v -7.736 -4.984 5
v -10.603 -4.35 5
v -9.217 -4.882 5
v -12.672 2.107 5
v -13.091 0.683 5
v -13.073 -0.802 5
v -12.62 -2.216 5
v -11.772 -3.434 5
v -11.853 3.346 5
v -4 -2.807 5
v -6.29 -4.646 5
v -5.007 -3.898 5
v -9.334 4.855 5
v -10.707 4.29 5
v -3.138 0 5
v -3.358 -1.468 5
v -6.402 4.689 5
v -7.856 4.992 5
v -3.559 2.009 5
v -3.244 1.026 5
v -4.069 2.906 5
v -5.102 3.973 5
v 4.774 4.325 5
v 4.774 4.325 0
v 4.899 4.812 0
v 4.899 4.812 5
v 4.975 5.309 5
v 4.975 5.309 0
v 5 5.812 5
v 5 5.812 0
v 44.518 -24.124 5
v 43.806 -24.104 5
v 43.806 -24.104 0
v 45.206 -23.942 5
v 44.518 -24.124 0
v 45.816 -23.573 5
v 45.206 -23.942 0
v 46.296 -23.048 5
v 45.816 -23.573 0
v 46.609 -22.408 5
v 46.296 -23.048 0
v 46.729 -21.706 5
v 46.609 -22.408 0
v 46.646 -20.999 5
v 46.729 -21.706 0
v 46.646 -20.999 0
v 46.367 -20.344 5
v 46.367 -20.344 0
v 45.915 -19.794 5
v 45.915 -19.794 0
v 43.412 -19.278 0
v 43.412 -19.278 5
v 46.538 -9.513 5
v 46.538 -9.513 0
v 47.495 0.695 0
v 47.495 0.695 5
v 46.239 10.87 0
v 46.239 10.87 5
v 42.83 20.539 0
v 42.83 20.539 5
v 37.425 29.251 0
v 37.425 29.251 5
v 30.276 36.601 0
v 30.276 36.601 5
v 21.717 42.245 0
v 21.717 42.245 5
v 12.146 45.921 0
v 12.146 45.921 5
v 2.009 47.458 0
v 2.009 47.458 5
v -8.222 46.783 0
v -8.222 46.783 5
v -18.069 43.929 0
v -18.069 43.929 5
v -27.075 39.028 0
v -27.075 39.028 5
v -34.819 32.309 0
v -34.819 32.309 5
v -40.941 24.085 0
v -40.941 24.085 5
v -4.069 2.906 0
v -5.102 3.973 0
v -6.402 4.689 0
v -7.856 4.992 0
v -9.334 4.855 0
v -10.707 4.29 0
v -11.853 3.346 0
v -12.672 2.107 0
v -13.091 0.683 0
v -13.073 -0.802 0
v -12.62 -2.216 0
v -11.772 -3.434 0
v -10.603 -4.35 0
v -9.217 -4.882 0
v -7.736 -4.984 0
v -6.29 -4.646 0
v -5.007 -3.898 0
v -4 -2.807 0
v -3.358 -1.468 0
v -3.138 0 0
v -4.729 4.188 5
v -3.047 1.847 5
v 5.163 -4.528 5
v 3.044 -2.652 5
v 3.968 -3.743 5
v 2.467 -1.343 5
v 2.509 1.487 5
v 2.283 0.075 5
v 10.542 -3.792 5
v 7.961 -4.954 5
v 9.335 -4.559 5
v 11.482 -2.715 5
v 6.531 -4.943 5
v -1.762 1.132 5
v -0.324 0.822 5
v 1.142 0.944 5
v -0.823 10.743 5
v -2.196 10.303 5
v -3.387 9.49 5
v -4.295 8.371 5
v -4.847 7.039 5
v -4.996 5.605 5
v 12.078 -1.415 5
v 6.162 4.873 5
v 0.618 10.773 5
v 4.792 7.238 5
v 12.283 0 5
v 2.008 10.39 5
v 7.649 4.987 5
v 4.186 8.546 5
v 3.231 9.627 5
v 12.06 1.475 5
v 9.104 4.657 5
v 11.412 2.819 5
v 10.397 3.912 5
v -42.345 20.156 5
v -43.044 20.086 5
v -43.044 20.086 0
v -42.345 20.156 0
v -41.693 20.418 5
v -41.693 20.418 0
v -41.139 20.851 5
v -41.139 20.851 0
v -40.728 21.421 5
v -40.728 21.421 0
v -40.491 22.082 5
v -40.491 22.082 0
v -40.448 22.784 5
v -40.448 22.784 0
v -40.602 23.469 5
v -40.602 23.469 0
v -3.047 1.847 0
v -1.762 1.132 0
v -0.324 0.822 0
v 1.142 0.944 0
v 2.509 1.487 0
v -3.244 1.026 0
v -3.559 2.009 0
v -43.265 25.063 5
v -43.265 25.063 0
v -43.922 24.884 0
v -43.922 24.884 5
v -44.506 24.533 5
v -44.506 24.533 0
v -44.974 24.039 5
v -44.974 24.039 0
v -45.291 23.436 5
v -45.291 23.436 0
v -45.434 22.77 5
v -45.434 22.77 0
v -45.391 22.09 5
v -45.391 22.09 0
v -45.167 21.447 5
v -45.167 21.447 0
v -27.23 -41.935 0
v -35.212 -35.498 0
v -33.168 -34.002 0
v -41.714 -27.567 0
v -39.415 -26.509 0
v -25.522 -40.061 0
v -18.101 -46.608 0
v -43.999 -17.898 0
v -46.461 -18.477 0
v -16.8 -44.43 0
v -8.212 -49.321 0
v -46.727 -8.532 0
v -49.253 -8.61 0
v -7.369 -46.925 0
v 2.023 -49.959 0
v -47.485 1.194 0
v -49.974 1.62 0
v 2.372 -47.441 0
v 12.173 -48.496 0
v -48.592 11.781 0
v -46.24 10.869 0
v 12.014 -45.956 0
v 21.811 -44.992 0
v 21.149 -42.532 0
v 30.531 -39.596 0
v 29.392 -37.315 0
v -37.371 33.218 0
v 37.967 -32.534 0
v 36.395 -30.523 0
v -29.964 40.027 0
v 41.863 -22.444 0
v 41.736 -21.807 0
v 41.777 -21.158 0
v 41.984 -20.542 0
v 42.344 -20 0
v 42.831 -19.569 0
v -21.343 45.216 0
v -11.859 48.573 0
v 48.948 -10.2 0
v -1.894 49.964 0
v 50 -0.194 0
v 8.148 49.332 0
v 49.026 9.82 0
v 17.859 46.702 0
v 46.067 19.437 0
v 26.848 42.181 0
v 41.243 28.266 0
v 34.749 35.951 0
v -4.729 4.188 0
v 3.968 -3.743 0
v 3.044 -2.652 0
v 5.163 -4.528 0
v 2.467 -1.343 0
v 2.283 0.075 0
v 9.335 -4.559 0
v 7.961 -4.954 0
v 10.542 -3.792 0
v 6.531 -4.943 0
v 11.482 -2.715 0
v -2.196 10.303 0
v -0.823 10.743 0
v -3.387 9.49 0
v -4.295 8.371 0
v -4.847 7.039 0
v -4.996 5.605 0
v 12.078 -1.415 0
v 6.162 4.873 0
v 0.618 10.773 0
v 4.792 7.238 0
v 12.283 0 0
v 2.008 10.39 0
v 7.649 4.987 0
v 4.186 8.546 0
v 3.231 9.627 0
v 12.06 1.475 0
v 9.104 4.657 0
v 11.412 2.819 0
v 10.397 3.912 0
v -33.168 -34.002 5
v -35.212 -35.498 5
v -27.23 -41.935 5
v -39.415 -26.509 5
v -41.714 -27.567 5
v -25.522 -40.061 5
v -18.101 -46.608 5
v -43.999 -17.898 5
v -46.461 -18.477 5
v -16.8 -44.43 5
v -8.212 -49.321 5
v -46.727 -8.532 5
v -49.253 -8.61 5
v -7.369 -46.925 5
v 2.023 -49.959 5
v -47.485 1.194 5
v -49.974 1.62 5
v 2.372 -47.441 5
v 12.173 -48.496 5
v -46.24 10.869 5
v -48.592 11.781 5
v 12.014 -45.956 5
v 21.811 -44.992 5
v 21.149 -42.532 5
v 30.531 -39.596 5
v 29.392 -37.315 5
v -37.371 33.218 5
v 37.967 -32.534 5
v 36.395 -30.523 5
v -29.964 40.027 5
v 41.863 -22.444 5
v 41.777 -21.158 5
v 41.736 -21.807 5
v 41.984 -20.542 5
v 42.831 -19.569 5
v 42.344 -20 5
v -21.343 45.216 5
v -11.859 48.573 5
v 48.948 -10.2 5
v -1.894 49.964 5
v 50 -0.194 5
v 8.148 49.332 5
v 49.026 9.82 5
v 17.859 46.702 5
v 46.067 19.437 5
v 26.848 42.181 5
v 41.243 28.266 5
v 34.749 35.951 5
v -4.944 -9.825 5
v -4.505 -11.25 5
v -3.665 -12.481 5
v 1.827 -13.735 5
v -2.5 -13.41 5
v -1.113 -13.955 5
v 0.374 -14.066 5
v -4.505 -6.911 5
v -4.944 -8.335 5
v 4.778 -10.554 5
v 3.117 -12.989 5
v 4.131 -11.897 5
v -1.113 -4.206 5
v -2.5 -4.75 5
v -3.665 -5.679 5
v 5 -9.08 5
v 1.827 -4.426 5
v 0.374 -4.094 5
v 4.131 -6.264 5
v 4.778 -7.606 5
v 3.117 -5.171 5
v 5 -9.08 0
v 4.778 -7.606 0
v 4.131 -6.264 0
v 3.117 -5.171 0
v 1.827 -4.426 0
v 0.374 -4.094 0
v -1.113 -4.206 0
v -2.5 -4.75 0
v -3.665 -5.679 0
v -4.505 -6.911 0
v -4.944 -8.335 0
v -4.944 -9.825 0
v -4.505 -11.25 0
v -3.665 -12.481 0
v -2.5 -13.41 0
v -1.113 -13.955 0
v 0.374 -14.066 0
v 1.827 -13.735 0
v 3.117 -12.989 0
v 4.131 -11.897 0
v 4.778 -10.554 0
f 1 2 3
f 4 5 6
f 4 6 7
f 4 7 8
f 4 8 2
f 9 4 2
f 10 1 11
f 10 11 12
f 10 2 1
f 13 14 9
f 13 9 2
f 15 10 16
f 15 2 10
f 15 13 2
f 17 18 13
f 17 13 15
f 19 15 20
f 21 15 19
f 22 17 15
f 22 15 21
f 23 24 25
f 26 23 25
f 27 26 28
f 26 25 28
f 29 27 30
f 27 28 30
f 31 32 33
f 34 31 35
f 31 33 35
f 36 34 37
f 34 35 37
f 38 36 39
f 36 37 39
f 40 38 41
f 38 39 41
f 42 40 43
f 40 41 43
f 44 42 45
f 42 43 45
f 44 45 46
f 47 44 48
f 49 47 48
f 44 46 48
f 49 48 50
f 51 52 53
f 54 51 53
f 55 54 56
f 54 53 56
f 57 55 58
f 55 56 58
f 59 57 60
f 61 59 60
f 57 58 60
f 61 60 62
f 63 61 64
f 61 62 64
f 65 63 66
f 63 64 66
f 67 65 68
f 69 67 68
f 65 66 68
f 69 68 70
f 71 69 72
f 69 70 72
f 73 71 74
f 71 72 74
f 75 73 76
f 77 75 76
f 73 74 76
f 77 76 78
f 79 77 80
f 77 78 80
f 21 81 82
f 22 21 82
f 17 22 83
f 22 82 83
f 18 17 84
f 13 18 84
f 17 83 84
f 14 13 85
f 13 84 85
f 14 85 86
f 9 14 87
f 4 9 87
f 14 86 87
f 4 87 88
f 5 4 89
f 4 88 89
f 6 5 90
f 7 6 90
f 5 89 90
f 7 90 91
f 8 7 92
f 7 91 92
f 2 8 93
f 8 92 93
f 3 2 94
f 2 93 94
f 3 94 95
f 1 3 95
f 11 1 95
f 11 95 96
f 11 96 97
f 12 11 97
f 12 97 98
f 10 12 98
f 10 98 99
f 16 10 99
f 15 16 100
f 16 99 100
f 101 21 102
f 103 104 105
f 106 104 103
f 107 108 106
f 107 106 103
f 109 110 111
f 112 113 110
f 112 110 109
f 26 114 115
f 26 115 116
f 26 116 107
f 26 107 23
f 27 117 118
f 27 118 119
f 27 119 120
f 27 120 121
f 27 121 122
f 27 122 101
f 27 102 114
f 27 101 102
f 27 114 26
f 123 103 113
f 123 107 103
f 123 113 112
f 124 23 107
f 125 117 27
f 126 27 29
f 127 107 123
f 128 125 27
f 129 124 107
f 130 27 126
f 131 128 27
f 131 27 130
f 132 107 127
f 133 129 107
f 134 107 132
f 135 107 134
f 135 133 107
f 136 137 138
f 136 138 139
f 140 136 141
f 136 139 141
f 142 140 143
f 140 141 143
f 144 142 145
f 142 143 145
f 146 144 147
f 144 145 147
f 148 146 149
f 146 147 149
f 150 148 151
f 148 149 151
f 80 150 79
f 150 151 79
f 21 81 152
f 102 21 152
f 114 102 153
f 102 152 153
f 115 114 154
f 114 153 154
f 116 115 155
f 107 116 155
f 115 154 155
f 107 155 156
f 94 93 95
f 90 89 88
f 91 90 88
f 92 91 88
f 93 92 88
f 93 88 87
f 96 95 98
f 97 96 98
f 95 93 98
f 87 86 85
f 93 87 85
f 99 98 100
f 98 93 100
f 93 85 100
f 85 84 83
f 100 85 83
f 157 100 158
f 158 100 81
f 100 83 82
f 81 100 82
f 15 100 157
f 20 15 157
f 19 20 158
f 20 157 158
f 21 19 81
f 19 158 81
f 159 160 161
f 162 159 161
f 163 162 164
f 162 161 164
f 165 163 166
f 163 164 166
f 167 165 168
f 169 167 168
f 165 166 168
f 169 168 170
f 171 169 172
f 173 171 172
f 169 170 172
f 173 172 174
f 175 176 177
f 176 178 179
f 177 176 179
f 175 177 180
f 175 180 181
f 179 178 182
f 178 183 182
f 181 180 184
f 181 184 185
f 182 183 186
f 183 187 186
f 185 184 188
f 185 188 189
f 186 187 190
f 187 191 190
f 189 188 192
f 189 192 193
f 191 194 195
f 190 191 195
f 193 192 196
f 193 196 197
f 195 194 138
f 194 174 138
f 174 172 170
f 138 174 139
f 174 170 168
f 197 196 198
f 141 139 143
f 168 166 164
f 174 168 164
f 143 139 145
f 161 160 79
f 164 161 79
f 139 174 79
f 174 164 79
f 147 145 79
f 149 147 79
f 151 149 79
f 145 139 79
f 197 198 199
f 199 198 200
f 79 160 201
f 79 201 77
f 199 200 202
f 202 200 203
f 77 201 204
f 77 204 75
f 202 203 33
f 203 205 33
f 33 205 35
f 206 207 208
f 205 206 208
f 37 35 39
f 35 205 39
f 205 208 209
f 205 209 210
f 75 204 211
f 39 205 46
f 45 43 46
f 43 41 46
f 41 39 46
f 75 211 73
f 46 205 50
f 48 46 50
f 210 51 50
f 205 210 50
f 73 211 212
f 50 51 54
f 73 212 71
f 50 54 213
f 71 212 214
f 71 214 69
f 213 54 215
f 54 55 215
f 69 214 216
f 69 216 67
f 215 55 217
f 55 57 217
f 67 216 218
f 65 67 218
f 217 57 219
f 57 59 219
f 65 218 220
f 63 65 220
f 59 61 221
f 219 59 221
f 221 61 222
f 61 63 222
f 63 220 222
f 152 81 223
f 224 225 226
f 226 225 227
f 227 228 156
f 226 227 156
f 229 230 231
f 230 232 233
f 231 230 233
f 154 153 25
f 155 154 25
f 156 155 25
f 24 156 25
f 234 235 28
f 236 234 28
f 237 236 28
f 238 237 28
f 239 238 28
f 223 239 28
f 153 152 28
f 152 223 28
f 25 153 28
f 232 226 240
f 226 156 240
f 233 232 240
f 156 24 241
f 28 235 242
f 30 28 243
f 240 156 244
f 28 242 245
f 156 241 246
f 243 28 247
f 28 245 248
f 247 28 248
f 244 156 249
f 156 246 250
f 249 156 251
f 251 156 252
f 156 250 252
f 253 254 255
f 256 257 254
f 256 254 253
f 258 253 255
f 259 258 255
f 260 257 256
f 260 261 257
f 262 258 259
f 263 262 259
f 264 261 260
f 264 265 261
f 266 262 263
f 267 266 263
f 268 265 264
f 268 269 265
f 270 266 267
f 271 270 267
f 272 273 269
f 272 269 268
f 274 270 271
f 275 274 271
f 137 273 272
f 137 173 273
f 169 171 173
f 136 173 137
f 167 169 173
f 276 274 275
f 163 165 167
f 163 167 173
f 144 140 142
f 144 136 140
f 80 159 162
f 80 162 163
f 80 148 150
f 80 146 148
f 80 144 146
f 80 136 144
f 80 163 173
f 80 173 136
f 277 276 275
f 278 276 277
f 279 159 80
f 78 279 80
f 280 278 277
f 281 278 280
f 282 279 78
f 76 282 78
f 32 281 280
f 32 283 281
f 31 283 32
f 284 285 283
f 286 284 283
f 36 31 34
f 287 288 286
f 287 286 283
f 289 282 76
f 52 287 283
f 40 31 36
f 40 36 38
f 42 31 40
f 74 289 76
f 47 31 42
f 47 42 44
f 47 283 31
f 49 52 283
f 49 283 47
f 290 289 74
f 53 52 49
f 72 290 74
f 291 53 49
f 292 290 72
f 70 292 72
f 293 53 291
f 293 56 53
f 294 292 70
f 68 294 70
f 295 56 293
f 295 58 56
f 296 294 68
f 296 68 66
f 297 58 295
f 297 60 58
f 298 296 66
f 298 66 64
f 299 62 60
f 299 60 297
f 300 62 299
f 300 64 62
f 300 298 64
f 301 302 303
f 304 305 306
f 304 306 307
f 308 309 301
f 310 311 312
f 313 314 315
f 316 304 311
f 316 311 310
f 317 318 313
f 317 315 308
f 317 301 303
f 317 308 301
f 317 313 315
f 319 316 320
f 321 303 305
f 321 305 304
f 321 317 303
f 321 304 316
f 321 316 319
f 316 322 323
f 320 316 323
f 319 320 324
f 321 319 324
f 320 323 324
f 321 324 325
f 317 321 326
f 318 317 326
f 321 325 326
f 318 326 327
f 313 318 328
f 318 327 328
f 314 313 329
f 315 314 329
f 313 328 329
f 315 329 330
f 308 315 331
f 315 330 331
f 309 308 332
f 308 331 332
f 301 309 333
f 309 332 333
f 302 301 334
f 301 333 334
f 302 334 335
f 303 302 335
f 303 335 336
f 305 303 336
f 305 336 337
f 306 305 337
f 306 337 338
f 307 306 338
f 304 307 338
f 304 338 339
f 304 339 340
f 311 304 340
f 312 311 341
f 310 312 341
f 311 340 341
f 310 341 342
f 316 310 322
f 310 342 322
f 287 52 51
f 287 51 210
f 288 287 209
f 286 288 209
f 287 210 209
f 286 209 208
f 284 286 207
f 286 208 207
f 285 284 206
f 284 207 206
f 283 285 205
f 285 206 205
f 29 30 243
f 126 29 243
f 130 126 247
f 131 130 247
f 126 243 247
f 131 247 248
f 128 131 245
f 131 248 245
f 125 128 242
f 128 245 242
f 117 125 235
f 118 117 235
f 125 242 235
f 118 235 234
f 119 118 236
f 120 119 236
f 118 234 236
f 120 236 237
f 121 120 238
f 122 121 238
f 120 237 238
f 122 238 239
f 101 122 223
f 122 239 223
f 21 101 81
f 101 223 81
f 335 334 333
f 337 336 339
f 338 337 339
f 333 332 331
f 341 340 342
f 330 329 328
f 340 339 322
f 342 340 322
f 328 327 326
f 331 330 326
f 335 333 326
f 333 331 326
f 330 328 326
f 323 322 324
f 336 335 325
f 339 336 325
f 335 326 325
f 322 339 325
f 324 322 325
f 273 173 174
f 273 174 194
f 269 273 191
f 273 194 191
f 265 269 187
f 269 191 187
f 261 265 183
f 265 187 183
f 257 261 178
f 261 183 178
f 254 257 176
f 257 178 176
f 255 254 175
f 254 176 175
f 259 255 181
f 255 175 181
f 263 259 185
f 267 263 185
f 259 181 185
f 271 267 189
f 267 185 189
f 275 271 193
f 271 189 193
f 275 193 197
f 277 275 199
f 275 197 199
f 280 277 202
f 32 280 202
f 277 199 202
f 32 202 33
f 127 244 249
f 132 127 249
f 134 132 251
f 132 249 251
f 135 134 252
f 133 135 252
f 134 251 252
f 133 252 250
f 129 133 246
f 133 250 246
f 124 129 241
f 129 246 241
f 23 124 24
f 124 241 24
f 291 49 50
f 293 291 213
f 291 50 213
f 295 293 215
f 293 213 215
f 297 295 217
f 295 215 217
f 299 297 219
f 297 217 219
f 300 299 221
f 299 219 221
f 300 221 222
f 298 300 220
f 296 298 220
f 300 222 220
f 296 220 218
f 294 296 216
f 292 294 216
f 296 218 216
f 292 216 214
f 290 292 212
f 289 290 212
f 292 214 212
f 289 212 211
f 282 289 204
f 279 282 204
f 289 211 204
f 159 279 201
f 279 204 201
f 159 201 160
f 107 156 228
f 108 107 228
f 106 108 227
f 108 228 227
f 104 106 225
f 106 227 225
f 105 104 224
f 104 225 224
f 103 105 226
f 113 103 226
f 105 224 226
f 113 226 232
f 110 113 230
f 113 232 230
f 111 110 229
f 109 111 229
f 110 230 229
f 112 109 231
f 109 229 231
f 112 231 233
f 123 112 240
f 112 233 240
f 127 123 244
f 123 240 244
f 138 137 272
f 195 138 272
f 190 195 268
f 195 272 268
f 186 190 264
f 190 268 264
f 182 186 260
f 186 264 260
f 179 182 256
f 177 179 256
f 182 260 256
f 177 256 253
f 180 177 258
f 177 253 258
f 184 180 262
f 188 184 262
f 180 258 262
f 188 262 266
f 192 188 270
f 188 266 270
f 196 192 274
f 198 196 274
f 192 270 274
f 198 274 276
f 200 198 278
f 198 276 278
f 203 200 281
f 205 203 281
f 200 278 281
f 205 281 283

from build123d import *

# Parameters (mm, degrees)
F0_R     = 50
F1_DEPTH = 5
F2_R     = 47.5
F3_DEPTH = 5
F4_R     = 5
F5_DEPTH = 5
F6_R     = 2.5
F7_DEPTH = 5


with BuildPart() as f1:
    # F0 (on Top) → F1 (new body)
    with BuildSketch(Plane.XY):
        Circle(F0_R)
    extrude(amount=F1_DEPTH)

    # F2 (on face) → F3 (cut)
    with BuildSketch(Plane.XY.offset(5)):
        Circle(F2_R)
    extrude(amount=-F3_DEPTH, mode=Mode.SUBTRACT)

    # F6 (on Top) → F7 (join)
    with BuildSketch(Plane.XY):
        with Locations((-42.940509, 22.584302)):
            Circle(F6_R)
        with Locations((44.229992, -21.640321)):
            Circle(F6_R)
    extrude(amount=F7_DEPTH)


with BuildPart() as f5:
    # F4 (on Top) → F5 (new body)
    with BuildSketch(Plane.XY):
        with BuildLine():
            ThreePointArc((4.773879, 4.324892), (3.374706, 3.118626), (2.509046, 1.486634))
            ThreePointArc((2.509046, 1.486634), (3.908219, 2.6929), (4.773879, 4.324892))
        make_face()
        with BuildLine():
            ThreePointArc((4.773879, 4.324892), (3.908219, 2.6929), (2.509046, 1.486634))
            ThreePointArc((2.509046, 1.486634), (6.531058, -4.943146), (12.282924, 0))
            ThreePointArc((12.282924, 0), (9.778398, 4.332737), (4.773879, 4.324892))
        make_face()
        with BuildLine():
            ThreePointArc((5, 5.811526), (-1.525637, 10.573084), (-4.068973, 2.905763))
            ThreePointArc((-4.068973, 2.905763), (-1.054431, 0.923973), (2.509046, 1.486634))
            ThreePointArc((2.509046, 1.486634), (3.374706, 3.118626), (4.773879, 4.324892))
            ThreePointArc((4.773879, 4.324892), (4.943146, 5.05966), (5, 5.811526))
        make_face()
        with BuildLine():
            ThreePointArc((-4.068973, 2.905763), (-12.899504, -1.525637), (-3.137946, 0))
            ThreePointArc((-3.137946, 0), (-3.376388, 1.525637), (-4.068973, 2.905763))
        make_face()
        with Locations((0, -9.080243)):
            Circle(F4_R)
    extrude(amount=F5_DEPTH)


solid = Compound([f1.part, f5.part])
